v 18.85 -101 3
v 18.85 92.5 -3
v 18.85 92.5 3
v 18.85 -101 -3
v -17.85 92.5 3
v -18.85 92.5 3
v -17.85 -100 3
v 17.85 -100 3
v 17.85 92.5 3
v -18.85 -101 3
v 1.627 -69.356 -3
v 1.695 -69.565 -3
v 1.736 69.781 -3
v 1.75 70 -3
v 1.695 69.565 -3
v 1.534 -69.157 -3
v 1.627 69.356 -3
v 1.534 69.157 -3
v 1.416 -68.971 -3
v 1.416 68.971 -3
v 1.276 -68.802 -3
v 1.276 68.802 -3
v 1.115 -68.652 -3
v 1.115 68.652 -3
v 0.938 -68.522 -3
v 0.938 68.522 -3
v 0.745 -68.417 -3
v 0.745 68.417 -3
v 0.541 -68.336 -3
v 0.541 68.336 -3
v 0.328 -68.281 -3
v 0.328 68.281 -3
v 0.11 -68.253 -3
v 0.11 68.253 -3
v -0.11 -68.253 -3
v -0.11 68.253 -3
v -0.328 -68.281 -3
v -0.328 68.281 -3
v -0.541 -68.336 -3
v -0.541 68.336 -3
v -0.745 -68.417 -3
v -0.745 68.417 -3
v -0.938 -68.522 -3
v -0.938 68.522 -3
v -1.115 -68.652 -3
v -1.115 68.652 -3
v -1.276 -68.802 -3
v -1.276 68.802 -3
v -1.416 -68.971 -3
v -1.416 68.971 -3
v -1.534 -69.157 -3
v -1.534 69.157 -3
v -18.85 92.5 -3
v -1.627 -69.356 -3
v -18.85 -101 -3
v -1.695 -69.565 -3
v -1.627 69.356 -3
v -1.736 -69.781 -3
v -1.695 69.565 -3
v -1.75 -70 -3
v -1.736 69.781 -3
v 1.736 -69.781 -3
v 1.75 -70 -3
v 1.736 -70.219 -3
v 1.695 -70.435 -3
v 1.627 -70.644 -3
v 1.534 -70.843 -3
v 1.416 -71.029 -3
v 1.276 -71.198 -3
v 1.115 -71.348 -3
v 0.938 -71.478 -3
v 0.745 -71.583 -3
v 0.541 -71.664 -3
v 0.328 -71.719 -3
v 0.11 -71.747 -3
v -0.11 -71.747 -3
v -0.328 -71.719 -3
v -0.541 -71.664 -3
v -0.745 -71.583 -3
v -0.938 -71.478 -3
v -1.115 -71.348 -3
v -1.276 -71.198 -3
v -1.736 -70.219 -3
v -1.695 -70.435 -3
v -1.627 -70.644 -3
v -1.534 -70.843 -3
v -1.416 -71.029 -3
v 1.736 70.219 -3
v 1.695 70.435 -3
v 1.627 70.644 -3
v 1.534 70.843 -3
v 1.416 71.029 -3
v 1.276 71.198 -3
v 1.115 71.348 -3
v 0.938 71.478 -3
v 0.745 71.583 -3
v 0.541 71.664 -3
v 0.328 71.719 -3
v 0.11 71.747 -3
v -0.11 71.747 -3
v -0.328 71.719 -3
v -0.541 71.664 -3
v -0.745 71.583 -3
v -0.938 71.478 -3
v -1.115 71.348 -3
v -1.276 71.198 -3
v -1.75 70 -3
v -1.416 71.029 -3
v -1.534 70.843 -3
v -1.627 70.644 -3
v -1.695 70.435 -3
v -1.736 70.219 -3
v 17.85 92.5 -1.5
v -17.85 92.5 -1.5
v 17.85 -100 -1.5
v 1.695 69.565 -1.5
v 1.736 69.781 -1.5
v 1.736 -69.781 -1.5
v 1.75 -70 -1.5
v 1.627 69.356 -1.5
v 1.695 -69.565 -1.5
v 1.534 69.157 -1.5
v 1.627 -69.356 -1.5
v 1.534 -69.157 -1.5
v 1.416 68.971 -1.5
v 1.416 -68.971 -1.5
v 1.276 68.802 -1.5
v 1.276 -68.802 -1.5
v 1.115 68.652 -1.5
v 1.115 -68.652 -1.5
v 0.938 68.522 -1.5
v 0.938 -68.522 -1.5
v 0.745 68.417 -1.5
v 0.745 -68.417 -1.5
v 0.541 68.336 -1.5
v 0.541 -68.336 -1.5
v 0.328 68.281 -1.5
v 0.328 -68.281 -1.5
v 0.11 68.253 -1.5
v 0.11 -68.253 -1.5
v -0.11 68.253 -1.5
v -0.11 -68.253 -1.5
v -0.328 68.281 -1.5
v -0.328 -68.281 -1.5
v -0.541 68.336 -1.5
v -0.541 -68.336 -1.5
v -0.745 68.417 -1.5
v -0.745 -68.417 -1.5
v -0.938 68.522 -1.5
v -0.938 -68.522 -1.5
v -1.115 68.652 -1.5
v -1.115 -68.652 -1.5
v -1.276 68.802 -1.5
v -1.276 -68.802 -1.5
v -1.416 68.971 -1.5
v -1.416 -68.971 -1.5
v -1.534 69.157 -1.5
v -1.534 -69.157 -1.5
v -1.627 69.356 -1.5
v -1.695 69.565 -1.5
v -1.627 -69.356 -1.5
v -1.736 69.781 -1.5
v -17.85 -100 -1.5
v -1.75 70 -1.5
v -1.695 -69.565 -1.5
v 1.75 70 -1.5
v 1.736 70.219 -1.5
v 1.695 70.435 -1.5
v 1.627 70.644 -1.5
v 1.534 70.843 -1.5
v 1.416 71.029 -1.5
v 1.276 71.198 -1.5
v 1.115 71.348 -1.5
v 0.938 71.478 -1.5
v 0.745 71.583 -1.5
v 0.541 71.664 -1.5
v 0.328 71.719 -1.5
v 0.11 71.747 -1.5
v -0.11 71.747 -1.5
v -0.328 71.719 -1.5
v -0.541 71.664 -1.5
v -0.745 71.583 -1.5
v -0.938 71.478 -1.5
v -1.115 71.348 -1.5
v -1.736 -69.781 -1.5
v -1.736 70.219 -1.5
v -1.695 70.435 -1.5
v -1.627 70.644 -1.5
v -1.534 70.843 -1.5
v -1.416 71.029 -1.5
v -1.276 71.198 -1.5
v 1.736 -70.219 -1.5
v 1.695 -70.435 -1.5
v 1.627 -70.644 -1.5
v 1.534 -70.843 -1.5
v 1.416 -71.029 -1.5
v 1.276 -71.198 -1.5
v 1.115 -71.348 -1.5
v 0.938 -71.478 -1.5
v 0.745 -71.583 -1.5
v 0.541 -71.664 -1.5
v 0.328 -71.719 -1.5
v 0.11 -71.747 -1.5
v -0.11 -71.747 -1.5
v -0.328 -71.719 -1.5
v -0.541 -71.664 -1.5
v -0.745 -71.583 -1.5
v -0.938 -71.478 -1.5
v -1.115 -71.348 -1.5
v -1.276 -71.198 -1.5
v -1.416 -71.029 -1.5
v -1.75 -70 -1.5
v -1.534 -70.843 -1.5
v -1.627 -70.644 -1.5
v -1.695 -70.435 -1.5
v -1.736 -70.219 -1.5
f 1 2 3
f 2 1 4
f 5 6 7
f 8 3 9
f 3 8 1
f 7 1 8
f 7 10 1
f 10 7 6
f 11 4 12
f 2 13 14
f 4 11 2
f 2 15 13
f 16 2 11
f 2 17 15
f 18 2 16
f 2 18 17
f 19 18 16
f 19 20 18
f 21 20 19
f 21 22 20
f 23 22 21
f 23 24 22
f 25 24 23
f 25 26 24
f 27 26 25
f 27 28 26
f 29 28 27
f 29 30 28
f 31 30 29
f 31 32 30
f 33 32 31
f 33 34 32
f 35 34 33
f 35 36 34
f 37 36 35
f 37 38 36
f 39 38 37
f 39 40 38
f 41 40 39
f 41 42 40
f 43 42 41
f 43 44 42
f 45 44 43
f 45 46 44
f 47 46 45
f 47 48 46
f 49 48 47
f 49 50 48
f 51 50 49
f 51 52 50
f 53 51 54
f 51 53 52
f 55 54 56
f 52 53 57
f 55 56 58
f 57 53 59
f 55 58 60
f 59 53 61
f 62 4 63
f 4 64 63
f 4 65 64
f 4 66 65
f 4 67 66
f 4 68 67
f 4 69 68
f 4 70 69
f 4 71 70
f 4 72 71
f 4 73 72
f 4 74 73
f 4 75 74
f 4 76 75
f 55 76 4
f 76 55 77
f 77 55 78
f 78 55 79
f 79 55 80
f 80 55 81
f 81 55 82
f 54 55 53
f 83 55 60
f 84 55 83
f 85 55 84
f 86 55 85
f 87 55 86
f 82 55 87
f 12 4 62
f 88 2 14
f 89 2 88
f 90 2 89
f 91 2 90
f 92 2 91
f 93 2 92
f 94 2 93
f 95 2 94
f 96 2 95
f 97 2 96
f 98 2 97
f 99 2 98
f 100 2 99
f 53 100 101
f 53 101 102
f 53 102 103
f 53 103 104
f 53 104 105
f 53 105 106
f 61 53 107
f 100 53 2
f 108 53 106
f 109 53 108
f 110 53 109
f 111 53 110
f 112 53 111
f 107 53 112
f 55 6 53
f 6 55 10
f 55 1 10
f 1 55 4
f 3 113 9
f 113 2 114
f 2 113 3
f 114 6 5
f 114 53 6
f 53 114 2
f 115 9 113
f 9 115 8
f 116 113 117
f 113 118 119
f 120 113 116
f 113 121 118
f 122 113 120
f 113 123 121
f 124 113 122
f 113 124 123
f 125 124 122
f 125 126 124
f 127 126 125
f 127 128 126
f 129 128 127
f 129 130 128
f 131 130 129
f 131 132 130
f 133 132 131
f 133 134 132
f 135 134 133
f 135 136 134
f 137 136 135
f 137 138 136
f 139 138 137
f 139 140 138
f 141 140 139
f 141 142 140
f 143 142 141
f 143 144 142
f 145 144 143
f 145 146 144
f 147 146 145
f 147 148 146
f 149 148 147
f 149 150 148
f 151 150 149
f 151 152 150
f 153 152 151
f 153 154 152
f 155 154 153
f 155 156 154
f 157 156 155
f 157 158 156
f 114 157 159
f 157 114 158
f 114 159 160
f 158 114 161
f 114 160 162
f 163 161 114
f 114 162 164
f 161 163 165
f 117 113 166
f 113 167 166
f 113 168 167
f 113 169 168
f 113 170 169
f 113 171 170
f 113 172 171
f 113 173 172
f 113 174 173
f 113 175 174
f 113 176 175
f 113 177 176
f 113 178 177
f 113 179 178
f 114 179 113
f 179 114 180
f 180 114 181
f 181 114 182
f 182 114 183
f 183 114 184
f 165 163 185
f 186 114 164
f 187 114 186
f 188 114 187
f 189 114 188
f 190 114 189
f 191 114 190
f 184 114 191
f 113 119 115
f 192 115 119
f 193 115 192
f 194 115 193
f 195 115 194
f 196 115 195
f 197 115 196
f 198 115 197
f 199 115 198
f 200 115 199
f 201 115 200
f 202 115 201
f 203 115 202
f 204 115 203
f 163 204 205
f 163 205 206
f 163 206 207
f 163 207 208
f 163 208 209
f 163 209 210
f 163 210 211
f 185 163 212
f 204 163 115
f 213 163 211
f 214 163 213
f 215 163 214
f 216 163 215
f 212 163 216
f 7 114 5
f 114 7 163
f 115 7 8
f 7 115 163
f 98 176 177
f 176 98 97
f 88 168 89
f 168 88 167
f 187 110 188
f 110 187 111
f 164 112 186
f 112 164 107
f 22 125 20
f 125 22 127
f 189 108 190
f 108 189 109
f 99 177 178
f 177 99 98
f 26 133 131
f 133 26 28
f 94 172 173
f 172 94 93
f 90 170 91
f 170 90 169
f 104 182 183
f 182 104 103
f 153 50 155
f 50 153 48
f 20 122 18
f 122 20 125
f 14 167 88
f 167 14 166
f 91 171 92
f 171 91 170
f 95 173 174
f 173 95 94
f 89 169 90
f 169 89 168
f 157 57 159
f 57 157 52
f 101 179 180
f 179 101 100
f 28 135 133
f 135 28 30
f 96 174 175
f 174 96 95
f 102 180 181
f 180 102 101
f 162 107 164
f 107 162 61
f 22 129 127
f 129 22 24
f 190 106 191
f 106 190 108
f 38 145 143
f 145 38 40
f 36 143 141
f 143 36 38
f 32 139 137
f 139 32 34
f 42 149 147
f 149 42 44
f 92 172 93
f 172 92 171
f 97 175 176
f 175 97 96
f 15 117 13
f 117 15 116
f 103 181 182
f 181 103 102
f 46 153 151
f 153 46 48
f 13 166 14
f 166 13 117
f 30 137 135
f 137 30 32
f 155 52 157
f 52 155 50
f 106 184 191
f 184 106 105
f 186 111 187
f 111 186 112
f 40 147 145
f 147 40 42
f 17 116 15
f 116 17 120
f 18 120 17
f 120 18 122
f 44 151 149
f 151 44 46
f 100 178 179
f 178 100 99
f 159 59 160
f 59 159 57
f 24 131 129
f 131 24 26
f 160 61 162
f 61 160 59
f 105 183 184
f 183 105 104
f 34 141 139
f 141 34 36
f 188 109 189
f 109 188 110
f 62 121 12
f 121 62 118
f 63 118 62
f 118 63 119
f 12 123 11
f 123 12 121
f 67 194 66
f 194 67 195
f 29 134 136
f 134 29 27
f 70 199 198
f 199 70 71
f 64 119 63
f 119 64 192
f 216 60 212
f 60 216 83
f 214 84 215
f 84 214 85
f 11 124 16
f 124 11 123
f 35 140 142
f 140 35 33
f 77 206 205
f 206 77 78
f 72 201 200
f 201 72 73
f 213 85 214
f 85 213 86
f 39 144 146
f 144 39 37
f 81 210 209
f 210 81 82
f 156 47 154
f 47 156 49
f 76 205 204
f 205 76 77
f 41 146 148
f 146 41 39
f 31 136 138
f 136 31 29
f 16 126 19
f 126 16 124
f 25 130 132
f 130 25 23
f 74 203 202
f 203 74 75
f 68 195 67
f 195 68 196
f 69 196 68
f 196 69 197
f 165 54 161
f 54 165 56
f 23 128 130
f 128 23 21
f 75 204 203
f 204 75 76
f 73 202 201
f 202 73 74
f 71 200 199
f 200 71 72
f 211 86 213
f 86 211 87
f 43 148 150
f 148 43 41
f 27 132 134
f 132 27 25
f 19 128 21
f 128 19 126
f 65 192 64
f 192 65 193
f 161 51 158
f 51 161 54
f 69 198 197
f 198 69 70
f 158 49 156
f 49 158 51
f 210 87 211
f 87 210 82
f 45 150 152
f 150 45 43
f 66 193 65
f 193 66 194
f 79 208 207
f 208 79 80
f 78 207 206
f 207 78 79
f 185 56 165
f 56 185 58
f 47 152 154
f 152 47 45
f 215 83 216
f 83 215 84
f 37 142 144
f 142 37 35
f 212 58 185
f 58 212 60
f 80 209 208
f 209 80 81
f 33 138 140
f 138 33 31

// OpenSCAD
h = 10;   // altura de la tabla
ancho = 35.7; // ancho de la tabla
d = 3.5;  // diametro del agujero
largo = 200; // largo de la tabla
grosor = h/2; // altura de la plantilla 
distancia_cadenas = 140;
delta = 1; // espesor de borde
distancia_recorte = 200;  // recorte para dejar un lado abierto
recorte = 15;  //recorte para dejar un lado abierto

difference(){
	cube([ancho+2*delta,largo+2*delta,grosor+delta], center=true);
	translate([0,distancia_recorte/2,0]) cube([ancho+10,recorte,recorte], center=true);
	translate([0,0,delta]) cube([ancho,largo,grosor], center=true);
	translate([0,distancia_cadenas/2,0]) cylinder(h,d=d,center=true,$fn=50);
	translate([0,-distancia_cadenas/2,0]) cylinder(h,d=d,center=true,$fn=50);
}
